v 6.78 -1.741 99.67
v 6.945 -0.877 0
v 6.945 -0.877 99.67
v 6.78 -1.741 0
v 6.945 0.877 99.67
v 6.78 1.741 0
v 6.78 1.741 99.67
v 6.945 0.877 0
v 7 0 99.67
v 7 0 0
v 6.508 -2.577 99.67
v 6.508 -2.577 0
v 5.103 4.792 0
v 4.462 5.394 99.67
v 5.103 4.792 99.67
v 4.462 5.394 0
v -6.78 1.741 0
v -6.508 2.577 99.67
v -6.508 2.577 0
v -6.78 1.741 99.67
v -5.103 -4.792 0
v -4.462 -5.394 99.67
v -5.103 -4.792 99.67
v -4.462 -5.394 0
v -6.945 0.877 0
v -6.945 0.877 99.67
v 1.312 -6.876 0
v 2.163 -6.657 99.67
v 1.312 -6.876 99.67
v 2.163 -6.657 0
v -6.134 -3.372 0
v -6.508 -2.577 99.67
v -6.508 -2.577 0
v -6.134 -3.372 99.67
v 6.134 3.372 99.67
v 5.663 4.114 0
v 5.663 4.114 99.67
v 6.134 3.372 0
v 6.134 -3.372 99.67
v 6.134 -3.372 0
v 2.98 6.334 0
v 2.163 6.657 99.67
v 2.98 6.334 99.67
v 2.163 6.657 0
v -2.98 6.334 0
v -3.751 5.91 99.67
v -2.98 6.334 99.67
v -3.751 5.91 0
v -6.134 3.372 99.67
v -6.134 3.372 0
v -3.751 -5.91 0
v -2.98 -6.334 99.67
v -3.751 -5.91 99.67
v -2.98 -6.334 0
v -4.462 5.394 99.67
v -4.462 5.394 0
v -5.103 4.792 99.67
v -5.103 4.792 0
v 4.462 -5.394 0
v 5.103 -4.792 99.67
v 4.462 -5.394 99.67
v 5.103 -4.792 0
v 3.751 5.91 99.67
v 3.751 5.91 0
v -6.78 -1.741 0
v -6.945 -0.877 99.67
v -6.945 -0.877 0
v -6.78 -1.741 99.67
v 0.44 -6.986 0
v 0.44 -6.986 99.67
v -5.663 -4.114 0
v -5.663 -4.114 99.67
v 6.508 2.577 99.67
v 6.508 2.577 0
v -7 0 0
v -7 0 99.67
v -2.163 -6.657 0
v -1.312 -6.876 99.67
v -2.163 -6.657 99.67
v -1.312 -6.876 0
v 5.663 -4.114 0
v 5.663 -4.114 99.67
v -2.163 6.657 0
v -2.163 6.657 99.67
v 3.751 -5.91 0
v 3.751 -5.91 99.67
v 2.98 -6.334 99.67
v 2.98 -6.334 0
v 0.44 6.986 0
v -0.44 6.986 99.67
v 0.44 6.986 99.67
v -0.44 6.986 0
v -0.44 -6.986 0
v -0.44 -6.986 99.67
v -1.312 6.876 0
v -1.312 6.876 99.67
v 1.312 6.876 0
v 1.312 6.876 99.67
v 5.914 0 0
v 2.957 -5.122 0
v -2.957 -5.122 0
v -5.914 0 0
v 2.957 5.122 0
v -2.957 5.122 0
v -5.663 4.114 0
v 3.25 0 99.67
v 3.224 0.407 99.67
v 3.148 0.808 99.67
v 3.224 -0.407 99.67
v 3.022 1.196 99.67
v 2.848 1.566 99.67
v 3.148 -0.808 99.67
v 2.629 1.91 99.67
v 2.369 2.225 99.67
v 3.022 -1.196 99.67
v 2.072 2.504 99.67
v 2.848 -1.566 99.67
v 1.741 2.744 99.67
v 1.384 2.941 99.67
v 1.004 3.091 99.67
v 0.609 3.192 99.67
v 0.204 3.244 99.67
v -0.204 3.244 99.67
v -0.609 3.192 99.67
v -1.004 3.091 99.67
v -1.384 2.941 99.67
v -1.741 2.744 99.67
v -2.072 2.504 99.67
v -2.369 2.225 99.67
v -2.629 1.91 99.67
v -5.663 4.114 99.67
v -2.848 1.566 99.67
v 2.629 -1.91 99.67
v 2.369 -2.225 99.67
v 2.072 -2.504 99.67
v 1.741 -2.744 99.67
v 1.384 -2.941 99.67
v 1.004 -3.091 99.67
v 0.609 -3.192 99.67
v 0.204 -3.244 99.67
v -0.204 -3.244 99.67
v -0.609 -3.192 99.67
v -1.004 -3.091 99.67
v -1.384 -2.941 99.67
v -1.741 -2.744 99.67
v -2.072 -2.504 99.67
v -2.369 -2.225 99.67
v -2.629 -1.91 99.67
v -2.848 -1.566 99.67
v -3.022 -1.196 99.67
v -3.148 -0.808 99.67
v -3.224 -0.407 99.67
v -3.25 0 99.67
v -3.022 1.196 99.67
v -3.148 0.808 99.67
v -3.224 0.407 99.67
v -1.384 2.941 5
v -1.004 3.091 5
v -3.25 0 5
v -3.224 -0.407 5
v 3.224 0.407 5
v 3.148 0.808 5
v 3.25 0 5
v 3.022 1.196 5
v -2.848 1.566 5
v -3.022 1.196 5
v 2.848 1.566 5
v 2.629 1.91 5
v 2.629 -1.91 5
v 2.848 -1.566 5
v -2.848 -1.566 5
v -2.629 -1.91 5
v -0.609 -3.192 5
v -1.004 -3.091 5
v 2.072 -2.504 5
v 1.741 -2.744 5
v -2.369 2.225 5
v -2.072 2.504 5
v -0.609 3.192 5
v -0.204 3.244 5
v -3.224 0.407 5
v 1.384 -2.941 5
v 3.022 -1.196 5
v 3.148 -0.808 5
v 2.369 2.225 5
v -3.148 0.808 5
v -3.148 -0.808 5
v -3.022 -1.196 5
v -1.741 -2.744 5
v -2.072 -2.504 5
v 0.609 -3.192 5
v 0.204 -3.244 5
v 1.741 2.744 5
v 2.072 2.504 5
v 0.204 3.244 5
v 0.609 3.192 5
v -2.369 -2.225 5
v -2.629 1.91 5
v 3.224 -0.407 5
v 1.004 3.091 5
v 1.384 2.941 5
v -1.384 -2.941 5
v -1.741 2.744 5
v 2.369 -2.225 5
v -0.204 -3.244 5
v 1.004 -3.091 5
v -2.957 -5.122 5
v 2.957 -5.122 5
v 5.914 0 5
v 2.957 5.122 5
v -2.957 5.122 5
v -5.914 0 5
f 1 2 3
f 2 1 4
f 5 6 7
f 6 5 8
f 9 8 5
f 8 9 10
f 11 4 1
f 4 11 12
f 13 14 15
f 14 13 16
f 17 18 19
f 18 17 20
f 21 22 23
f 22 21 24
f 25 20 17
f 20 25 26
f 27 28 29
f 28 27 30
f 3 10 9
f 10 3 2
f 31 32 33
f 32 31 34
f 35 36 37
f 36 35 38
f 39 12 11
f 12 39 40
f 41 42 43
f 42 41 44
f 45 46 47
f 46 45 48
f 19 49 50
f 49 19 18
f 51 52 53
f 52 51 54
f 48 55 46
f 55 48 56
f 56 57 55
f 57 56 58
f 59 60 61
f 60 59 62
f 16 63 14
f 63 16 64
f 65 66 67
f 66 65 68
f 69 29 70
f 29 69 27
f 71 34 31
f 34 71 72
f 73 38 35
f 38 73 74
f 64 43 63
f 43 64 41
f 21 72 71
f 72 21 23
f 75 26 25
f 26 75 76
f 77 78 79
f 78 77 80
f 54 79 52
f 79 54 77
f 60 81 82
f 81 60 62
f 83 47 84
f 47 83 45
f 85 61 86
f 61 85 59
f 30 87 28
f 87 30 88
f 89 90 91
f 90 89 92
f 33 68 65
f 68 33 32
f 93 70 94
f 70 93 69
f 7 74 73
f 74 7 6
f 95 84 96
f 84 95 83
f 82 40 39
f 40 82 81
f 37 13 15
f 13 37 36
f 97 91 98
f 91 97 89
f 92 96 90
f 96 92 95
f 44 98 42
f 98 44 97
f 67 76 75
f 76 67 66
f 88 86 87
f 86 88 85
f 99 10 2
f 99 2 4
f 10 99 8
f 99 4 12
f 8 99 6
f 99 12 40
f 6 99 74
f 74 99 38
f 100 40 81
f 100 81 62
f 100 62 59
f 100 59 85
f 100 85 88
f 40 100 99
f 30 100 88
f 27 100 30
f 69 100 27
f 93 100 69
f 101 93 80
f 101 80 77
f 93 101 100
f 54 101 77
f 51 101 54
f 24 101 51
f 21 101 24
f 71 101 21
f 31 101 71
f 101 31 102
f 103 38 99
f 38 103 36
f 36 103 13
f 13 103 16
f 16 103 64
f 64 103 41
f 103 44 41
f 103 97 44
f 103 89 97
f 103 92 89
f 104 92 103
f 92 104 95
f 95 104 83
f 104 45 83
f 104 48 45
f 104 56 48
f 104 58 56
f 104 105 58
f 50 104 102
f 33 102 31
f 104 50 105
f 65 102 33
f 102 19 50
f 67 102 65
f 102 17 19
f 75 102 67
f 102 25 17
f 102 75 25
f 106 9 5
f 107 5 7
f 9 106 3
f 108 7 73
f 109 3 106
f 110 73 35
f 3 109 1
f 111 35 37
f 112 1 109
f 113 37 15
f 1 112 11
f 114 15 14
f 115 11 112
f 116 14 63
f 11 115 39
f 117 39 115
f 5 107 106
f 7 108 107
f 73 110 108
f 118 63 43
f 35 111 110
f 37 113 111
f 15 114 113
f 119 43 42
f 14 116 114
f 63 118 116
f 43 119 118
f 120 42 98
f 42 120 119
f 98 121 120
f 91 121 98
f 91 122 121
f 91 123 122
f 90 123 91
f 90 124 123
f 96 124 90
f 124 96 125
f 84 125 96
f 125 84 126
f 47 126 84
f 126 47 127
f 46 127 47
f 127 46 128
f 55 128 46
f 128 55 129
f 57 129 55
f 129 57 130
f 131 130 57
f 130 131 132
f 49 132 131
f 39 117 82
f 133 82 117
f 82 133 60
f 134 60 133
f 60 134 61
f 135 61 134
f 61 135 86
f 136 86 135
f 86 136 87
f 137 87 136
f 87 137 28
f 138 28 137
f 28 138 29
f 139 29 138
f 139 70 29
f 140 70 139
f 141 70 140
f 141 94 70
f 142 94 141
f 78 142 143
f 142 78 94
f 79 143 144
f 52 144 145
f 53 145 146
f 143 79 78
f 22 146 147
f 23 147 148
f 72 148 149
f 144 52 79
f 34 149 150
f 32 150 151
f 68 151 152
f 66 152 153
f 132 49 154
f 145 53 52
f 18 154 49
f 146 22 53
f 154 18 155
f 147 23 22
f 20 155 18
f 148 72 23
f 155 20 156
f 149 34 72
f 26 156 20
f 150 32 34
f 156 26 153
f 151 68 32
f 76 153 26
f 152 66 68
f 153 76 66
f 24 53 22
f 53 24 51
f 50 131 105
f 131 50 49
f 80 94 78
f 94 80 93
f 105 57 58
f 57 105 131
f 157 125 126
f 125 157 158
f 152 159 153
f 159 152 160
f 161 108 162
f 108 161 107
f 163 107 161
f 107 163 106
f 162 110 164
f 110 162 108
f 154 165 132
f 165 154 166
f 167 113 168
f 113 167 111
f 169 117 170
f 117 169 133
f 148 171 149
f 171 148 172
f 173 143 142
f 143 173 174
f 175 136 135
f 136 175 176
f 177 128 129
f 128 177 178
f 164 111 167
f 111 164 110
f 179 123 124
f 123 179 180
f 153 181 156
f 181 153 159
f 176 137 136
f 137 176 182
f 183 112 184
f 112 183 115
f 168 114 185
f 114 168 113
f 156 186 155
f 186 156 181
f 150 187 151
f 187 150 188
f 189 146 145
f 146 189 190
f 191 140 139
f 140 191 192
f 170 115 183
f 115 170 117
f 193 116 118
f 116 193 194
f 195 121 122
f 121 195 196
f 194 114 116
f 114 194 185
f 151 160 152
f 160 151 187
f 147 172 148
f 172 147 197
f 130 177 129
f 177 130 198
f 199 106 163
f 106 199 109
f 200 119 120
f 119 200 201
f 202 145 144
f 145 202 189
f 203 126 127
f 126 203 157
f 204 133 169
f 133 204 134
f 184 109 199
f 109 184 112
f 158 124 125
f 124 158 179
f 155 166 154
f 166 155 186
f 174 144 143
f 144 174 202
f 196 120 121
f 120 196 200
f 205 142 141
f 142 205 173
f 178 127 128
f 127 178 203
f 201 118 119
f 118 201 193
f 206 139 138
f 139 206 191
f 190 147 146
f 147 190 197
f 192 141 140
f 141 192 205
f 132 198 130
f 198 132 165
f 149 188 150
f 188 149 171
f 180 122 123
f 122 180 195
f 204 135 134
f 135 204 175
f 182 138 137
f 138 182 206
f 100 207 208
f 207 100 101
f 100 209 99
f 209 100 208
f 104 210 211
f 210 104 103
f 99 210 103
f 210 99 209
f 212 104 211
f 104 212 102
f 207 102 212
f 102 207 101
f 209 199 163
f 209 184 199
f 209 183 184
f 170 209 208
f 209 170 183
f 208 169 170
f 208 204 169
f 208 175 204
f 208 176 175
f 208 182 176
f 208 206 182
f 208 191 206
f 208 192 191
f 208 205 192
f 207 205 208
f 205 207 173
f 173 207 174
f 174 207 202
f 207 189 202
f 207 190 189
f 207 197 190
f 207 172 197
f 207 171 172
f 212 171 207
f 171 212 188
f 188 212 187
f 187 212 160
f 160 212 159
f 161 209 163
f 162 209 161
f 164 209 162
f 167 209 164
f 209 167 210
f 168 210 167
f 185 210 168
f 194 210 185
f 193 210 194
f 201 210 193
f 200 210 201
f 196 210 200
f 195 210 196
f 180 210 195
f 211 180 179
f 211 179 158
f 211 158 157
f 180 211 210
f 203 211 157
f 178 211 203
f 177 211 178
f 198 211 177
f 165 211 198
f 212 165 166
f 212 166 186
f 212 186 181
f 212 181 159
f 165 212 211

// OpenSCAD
// Dimensions in mm
thickness = 99.67;
pocket_depth = 5;

$fn = 50;
difference() {
    cylinder(r=7,h=thickness);
    translate([0,0,-1]) cylinder(r=3.25,h=thickness+2);
    cylinder(r=5.91425,h=pocket_depth,$fn=6);
}
